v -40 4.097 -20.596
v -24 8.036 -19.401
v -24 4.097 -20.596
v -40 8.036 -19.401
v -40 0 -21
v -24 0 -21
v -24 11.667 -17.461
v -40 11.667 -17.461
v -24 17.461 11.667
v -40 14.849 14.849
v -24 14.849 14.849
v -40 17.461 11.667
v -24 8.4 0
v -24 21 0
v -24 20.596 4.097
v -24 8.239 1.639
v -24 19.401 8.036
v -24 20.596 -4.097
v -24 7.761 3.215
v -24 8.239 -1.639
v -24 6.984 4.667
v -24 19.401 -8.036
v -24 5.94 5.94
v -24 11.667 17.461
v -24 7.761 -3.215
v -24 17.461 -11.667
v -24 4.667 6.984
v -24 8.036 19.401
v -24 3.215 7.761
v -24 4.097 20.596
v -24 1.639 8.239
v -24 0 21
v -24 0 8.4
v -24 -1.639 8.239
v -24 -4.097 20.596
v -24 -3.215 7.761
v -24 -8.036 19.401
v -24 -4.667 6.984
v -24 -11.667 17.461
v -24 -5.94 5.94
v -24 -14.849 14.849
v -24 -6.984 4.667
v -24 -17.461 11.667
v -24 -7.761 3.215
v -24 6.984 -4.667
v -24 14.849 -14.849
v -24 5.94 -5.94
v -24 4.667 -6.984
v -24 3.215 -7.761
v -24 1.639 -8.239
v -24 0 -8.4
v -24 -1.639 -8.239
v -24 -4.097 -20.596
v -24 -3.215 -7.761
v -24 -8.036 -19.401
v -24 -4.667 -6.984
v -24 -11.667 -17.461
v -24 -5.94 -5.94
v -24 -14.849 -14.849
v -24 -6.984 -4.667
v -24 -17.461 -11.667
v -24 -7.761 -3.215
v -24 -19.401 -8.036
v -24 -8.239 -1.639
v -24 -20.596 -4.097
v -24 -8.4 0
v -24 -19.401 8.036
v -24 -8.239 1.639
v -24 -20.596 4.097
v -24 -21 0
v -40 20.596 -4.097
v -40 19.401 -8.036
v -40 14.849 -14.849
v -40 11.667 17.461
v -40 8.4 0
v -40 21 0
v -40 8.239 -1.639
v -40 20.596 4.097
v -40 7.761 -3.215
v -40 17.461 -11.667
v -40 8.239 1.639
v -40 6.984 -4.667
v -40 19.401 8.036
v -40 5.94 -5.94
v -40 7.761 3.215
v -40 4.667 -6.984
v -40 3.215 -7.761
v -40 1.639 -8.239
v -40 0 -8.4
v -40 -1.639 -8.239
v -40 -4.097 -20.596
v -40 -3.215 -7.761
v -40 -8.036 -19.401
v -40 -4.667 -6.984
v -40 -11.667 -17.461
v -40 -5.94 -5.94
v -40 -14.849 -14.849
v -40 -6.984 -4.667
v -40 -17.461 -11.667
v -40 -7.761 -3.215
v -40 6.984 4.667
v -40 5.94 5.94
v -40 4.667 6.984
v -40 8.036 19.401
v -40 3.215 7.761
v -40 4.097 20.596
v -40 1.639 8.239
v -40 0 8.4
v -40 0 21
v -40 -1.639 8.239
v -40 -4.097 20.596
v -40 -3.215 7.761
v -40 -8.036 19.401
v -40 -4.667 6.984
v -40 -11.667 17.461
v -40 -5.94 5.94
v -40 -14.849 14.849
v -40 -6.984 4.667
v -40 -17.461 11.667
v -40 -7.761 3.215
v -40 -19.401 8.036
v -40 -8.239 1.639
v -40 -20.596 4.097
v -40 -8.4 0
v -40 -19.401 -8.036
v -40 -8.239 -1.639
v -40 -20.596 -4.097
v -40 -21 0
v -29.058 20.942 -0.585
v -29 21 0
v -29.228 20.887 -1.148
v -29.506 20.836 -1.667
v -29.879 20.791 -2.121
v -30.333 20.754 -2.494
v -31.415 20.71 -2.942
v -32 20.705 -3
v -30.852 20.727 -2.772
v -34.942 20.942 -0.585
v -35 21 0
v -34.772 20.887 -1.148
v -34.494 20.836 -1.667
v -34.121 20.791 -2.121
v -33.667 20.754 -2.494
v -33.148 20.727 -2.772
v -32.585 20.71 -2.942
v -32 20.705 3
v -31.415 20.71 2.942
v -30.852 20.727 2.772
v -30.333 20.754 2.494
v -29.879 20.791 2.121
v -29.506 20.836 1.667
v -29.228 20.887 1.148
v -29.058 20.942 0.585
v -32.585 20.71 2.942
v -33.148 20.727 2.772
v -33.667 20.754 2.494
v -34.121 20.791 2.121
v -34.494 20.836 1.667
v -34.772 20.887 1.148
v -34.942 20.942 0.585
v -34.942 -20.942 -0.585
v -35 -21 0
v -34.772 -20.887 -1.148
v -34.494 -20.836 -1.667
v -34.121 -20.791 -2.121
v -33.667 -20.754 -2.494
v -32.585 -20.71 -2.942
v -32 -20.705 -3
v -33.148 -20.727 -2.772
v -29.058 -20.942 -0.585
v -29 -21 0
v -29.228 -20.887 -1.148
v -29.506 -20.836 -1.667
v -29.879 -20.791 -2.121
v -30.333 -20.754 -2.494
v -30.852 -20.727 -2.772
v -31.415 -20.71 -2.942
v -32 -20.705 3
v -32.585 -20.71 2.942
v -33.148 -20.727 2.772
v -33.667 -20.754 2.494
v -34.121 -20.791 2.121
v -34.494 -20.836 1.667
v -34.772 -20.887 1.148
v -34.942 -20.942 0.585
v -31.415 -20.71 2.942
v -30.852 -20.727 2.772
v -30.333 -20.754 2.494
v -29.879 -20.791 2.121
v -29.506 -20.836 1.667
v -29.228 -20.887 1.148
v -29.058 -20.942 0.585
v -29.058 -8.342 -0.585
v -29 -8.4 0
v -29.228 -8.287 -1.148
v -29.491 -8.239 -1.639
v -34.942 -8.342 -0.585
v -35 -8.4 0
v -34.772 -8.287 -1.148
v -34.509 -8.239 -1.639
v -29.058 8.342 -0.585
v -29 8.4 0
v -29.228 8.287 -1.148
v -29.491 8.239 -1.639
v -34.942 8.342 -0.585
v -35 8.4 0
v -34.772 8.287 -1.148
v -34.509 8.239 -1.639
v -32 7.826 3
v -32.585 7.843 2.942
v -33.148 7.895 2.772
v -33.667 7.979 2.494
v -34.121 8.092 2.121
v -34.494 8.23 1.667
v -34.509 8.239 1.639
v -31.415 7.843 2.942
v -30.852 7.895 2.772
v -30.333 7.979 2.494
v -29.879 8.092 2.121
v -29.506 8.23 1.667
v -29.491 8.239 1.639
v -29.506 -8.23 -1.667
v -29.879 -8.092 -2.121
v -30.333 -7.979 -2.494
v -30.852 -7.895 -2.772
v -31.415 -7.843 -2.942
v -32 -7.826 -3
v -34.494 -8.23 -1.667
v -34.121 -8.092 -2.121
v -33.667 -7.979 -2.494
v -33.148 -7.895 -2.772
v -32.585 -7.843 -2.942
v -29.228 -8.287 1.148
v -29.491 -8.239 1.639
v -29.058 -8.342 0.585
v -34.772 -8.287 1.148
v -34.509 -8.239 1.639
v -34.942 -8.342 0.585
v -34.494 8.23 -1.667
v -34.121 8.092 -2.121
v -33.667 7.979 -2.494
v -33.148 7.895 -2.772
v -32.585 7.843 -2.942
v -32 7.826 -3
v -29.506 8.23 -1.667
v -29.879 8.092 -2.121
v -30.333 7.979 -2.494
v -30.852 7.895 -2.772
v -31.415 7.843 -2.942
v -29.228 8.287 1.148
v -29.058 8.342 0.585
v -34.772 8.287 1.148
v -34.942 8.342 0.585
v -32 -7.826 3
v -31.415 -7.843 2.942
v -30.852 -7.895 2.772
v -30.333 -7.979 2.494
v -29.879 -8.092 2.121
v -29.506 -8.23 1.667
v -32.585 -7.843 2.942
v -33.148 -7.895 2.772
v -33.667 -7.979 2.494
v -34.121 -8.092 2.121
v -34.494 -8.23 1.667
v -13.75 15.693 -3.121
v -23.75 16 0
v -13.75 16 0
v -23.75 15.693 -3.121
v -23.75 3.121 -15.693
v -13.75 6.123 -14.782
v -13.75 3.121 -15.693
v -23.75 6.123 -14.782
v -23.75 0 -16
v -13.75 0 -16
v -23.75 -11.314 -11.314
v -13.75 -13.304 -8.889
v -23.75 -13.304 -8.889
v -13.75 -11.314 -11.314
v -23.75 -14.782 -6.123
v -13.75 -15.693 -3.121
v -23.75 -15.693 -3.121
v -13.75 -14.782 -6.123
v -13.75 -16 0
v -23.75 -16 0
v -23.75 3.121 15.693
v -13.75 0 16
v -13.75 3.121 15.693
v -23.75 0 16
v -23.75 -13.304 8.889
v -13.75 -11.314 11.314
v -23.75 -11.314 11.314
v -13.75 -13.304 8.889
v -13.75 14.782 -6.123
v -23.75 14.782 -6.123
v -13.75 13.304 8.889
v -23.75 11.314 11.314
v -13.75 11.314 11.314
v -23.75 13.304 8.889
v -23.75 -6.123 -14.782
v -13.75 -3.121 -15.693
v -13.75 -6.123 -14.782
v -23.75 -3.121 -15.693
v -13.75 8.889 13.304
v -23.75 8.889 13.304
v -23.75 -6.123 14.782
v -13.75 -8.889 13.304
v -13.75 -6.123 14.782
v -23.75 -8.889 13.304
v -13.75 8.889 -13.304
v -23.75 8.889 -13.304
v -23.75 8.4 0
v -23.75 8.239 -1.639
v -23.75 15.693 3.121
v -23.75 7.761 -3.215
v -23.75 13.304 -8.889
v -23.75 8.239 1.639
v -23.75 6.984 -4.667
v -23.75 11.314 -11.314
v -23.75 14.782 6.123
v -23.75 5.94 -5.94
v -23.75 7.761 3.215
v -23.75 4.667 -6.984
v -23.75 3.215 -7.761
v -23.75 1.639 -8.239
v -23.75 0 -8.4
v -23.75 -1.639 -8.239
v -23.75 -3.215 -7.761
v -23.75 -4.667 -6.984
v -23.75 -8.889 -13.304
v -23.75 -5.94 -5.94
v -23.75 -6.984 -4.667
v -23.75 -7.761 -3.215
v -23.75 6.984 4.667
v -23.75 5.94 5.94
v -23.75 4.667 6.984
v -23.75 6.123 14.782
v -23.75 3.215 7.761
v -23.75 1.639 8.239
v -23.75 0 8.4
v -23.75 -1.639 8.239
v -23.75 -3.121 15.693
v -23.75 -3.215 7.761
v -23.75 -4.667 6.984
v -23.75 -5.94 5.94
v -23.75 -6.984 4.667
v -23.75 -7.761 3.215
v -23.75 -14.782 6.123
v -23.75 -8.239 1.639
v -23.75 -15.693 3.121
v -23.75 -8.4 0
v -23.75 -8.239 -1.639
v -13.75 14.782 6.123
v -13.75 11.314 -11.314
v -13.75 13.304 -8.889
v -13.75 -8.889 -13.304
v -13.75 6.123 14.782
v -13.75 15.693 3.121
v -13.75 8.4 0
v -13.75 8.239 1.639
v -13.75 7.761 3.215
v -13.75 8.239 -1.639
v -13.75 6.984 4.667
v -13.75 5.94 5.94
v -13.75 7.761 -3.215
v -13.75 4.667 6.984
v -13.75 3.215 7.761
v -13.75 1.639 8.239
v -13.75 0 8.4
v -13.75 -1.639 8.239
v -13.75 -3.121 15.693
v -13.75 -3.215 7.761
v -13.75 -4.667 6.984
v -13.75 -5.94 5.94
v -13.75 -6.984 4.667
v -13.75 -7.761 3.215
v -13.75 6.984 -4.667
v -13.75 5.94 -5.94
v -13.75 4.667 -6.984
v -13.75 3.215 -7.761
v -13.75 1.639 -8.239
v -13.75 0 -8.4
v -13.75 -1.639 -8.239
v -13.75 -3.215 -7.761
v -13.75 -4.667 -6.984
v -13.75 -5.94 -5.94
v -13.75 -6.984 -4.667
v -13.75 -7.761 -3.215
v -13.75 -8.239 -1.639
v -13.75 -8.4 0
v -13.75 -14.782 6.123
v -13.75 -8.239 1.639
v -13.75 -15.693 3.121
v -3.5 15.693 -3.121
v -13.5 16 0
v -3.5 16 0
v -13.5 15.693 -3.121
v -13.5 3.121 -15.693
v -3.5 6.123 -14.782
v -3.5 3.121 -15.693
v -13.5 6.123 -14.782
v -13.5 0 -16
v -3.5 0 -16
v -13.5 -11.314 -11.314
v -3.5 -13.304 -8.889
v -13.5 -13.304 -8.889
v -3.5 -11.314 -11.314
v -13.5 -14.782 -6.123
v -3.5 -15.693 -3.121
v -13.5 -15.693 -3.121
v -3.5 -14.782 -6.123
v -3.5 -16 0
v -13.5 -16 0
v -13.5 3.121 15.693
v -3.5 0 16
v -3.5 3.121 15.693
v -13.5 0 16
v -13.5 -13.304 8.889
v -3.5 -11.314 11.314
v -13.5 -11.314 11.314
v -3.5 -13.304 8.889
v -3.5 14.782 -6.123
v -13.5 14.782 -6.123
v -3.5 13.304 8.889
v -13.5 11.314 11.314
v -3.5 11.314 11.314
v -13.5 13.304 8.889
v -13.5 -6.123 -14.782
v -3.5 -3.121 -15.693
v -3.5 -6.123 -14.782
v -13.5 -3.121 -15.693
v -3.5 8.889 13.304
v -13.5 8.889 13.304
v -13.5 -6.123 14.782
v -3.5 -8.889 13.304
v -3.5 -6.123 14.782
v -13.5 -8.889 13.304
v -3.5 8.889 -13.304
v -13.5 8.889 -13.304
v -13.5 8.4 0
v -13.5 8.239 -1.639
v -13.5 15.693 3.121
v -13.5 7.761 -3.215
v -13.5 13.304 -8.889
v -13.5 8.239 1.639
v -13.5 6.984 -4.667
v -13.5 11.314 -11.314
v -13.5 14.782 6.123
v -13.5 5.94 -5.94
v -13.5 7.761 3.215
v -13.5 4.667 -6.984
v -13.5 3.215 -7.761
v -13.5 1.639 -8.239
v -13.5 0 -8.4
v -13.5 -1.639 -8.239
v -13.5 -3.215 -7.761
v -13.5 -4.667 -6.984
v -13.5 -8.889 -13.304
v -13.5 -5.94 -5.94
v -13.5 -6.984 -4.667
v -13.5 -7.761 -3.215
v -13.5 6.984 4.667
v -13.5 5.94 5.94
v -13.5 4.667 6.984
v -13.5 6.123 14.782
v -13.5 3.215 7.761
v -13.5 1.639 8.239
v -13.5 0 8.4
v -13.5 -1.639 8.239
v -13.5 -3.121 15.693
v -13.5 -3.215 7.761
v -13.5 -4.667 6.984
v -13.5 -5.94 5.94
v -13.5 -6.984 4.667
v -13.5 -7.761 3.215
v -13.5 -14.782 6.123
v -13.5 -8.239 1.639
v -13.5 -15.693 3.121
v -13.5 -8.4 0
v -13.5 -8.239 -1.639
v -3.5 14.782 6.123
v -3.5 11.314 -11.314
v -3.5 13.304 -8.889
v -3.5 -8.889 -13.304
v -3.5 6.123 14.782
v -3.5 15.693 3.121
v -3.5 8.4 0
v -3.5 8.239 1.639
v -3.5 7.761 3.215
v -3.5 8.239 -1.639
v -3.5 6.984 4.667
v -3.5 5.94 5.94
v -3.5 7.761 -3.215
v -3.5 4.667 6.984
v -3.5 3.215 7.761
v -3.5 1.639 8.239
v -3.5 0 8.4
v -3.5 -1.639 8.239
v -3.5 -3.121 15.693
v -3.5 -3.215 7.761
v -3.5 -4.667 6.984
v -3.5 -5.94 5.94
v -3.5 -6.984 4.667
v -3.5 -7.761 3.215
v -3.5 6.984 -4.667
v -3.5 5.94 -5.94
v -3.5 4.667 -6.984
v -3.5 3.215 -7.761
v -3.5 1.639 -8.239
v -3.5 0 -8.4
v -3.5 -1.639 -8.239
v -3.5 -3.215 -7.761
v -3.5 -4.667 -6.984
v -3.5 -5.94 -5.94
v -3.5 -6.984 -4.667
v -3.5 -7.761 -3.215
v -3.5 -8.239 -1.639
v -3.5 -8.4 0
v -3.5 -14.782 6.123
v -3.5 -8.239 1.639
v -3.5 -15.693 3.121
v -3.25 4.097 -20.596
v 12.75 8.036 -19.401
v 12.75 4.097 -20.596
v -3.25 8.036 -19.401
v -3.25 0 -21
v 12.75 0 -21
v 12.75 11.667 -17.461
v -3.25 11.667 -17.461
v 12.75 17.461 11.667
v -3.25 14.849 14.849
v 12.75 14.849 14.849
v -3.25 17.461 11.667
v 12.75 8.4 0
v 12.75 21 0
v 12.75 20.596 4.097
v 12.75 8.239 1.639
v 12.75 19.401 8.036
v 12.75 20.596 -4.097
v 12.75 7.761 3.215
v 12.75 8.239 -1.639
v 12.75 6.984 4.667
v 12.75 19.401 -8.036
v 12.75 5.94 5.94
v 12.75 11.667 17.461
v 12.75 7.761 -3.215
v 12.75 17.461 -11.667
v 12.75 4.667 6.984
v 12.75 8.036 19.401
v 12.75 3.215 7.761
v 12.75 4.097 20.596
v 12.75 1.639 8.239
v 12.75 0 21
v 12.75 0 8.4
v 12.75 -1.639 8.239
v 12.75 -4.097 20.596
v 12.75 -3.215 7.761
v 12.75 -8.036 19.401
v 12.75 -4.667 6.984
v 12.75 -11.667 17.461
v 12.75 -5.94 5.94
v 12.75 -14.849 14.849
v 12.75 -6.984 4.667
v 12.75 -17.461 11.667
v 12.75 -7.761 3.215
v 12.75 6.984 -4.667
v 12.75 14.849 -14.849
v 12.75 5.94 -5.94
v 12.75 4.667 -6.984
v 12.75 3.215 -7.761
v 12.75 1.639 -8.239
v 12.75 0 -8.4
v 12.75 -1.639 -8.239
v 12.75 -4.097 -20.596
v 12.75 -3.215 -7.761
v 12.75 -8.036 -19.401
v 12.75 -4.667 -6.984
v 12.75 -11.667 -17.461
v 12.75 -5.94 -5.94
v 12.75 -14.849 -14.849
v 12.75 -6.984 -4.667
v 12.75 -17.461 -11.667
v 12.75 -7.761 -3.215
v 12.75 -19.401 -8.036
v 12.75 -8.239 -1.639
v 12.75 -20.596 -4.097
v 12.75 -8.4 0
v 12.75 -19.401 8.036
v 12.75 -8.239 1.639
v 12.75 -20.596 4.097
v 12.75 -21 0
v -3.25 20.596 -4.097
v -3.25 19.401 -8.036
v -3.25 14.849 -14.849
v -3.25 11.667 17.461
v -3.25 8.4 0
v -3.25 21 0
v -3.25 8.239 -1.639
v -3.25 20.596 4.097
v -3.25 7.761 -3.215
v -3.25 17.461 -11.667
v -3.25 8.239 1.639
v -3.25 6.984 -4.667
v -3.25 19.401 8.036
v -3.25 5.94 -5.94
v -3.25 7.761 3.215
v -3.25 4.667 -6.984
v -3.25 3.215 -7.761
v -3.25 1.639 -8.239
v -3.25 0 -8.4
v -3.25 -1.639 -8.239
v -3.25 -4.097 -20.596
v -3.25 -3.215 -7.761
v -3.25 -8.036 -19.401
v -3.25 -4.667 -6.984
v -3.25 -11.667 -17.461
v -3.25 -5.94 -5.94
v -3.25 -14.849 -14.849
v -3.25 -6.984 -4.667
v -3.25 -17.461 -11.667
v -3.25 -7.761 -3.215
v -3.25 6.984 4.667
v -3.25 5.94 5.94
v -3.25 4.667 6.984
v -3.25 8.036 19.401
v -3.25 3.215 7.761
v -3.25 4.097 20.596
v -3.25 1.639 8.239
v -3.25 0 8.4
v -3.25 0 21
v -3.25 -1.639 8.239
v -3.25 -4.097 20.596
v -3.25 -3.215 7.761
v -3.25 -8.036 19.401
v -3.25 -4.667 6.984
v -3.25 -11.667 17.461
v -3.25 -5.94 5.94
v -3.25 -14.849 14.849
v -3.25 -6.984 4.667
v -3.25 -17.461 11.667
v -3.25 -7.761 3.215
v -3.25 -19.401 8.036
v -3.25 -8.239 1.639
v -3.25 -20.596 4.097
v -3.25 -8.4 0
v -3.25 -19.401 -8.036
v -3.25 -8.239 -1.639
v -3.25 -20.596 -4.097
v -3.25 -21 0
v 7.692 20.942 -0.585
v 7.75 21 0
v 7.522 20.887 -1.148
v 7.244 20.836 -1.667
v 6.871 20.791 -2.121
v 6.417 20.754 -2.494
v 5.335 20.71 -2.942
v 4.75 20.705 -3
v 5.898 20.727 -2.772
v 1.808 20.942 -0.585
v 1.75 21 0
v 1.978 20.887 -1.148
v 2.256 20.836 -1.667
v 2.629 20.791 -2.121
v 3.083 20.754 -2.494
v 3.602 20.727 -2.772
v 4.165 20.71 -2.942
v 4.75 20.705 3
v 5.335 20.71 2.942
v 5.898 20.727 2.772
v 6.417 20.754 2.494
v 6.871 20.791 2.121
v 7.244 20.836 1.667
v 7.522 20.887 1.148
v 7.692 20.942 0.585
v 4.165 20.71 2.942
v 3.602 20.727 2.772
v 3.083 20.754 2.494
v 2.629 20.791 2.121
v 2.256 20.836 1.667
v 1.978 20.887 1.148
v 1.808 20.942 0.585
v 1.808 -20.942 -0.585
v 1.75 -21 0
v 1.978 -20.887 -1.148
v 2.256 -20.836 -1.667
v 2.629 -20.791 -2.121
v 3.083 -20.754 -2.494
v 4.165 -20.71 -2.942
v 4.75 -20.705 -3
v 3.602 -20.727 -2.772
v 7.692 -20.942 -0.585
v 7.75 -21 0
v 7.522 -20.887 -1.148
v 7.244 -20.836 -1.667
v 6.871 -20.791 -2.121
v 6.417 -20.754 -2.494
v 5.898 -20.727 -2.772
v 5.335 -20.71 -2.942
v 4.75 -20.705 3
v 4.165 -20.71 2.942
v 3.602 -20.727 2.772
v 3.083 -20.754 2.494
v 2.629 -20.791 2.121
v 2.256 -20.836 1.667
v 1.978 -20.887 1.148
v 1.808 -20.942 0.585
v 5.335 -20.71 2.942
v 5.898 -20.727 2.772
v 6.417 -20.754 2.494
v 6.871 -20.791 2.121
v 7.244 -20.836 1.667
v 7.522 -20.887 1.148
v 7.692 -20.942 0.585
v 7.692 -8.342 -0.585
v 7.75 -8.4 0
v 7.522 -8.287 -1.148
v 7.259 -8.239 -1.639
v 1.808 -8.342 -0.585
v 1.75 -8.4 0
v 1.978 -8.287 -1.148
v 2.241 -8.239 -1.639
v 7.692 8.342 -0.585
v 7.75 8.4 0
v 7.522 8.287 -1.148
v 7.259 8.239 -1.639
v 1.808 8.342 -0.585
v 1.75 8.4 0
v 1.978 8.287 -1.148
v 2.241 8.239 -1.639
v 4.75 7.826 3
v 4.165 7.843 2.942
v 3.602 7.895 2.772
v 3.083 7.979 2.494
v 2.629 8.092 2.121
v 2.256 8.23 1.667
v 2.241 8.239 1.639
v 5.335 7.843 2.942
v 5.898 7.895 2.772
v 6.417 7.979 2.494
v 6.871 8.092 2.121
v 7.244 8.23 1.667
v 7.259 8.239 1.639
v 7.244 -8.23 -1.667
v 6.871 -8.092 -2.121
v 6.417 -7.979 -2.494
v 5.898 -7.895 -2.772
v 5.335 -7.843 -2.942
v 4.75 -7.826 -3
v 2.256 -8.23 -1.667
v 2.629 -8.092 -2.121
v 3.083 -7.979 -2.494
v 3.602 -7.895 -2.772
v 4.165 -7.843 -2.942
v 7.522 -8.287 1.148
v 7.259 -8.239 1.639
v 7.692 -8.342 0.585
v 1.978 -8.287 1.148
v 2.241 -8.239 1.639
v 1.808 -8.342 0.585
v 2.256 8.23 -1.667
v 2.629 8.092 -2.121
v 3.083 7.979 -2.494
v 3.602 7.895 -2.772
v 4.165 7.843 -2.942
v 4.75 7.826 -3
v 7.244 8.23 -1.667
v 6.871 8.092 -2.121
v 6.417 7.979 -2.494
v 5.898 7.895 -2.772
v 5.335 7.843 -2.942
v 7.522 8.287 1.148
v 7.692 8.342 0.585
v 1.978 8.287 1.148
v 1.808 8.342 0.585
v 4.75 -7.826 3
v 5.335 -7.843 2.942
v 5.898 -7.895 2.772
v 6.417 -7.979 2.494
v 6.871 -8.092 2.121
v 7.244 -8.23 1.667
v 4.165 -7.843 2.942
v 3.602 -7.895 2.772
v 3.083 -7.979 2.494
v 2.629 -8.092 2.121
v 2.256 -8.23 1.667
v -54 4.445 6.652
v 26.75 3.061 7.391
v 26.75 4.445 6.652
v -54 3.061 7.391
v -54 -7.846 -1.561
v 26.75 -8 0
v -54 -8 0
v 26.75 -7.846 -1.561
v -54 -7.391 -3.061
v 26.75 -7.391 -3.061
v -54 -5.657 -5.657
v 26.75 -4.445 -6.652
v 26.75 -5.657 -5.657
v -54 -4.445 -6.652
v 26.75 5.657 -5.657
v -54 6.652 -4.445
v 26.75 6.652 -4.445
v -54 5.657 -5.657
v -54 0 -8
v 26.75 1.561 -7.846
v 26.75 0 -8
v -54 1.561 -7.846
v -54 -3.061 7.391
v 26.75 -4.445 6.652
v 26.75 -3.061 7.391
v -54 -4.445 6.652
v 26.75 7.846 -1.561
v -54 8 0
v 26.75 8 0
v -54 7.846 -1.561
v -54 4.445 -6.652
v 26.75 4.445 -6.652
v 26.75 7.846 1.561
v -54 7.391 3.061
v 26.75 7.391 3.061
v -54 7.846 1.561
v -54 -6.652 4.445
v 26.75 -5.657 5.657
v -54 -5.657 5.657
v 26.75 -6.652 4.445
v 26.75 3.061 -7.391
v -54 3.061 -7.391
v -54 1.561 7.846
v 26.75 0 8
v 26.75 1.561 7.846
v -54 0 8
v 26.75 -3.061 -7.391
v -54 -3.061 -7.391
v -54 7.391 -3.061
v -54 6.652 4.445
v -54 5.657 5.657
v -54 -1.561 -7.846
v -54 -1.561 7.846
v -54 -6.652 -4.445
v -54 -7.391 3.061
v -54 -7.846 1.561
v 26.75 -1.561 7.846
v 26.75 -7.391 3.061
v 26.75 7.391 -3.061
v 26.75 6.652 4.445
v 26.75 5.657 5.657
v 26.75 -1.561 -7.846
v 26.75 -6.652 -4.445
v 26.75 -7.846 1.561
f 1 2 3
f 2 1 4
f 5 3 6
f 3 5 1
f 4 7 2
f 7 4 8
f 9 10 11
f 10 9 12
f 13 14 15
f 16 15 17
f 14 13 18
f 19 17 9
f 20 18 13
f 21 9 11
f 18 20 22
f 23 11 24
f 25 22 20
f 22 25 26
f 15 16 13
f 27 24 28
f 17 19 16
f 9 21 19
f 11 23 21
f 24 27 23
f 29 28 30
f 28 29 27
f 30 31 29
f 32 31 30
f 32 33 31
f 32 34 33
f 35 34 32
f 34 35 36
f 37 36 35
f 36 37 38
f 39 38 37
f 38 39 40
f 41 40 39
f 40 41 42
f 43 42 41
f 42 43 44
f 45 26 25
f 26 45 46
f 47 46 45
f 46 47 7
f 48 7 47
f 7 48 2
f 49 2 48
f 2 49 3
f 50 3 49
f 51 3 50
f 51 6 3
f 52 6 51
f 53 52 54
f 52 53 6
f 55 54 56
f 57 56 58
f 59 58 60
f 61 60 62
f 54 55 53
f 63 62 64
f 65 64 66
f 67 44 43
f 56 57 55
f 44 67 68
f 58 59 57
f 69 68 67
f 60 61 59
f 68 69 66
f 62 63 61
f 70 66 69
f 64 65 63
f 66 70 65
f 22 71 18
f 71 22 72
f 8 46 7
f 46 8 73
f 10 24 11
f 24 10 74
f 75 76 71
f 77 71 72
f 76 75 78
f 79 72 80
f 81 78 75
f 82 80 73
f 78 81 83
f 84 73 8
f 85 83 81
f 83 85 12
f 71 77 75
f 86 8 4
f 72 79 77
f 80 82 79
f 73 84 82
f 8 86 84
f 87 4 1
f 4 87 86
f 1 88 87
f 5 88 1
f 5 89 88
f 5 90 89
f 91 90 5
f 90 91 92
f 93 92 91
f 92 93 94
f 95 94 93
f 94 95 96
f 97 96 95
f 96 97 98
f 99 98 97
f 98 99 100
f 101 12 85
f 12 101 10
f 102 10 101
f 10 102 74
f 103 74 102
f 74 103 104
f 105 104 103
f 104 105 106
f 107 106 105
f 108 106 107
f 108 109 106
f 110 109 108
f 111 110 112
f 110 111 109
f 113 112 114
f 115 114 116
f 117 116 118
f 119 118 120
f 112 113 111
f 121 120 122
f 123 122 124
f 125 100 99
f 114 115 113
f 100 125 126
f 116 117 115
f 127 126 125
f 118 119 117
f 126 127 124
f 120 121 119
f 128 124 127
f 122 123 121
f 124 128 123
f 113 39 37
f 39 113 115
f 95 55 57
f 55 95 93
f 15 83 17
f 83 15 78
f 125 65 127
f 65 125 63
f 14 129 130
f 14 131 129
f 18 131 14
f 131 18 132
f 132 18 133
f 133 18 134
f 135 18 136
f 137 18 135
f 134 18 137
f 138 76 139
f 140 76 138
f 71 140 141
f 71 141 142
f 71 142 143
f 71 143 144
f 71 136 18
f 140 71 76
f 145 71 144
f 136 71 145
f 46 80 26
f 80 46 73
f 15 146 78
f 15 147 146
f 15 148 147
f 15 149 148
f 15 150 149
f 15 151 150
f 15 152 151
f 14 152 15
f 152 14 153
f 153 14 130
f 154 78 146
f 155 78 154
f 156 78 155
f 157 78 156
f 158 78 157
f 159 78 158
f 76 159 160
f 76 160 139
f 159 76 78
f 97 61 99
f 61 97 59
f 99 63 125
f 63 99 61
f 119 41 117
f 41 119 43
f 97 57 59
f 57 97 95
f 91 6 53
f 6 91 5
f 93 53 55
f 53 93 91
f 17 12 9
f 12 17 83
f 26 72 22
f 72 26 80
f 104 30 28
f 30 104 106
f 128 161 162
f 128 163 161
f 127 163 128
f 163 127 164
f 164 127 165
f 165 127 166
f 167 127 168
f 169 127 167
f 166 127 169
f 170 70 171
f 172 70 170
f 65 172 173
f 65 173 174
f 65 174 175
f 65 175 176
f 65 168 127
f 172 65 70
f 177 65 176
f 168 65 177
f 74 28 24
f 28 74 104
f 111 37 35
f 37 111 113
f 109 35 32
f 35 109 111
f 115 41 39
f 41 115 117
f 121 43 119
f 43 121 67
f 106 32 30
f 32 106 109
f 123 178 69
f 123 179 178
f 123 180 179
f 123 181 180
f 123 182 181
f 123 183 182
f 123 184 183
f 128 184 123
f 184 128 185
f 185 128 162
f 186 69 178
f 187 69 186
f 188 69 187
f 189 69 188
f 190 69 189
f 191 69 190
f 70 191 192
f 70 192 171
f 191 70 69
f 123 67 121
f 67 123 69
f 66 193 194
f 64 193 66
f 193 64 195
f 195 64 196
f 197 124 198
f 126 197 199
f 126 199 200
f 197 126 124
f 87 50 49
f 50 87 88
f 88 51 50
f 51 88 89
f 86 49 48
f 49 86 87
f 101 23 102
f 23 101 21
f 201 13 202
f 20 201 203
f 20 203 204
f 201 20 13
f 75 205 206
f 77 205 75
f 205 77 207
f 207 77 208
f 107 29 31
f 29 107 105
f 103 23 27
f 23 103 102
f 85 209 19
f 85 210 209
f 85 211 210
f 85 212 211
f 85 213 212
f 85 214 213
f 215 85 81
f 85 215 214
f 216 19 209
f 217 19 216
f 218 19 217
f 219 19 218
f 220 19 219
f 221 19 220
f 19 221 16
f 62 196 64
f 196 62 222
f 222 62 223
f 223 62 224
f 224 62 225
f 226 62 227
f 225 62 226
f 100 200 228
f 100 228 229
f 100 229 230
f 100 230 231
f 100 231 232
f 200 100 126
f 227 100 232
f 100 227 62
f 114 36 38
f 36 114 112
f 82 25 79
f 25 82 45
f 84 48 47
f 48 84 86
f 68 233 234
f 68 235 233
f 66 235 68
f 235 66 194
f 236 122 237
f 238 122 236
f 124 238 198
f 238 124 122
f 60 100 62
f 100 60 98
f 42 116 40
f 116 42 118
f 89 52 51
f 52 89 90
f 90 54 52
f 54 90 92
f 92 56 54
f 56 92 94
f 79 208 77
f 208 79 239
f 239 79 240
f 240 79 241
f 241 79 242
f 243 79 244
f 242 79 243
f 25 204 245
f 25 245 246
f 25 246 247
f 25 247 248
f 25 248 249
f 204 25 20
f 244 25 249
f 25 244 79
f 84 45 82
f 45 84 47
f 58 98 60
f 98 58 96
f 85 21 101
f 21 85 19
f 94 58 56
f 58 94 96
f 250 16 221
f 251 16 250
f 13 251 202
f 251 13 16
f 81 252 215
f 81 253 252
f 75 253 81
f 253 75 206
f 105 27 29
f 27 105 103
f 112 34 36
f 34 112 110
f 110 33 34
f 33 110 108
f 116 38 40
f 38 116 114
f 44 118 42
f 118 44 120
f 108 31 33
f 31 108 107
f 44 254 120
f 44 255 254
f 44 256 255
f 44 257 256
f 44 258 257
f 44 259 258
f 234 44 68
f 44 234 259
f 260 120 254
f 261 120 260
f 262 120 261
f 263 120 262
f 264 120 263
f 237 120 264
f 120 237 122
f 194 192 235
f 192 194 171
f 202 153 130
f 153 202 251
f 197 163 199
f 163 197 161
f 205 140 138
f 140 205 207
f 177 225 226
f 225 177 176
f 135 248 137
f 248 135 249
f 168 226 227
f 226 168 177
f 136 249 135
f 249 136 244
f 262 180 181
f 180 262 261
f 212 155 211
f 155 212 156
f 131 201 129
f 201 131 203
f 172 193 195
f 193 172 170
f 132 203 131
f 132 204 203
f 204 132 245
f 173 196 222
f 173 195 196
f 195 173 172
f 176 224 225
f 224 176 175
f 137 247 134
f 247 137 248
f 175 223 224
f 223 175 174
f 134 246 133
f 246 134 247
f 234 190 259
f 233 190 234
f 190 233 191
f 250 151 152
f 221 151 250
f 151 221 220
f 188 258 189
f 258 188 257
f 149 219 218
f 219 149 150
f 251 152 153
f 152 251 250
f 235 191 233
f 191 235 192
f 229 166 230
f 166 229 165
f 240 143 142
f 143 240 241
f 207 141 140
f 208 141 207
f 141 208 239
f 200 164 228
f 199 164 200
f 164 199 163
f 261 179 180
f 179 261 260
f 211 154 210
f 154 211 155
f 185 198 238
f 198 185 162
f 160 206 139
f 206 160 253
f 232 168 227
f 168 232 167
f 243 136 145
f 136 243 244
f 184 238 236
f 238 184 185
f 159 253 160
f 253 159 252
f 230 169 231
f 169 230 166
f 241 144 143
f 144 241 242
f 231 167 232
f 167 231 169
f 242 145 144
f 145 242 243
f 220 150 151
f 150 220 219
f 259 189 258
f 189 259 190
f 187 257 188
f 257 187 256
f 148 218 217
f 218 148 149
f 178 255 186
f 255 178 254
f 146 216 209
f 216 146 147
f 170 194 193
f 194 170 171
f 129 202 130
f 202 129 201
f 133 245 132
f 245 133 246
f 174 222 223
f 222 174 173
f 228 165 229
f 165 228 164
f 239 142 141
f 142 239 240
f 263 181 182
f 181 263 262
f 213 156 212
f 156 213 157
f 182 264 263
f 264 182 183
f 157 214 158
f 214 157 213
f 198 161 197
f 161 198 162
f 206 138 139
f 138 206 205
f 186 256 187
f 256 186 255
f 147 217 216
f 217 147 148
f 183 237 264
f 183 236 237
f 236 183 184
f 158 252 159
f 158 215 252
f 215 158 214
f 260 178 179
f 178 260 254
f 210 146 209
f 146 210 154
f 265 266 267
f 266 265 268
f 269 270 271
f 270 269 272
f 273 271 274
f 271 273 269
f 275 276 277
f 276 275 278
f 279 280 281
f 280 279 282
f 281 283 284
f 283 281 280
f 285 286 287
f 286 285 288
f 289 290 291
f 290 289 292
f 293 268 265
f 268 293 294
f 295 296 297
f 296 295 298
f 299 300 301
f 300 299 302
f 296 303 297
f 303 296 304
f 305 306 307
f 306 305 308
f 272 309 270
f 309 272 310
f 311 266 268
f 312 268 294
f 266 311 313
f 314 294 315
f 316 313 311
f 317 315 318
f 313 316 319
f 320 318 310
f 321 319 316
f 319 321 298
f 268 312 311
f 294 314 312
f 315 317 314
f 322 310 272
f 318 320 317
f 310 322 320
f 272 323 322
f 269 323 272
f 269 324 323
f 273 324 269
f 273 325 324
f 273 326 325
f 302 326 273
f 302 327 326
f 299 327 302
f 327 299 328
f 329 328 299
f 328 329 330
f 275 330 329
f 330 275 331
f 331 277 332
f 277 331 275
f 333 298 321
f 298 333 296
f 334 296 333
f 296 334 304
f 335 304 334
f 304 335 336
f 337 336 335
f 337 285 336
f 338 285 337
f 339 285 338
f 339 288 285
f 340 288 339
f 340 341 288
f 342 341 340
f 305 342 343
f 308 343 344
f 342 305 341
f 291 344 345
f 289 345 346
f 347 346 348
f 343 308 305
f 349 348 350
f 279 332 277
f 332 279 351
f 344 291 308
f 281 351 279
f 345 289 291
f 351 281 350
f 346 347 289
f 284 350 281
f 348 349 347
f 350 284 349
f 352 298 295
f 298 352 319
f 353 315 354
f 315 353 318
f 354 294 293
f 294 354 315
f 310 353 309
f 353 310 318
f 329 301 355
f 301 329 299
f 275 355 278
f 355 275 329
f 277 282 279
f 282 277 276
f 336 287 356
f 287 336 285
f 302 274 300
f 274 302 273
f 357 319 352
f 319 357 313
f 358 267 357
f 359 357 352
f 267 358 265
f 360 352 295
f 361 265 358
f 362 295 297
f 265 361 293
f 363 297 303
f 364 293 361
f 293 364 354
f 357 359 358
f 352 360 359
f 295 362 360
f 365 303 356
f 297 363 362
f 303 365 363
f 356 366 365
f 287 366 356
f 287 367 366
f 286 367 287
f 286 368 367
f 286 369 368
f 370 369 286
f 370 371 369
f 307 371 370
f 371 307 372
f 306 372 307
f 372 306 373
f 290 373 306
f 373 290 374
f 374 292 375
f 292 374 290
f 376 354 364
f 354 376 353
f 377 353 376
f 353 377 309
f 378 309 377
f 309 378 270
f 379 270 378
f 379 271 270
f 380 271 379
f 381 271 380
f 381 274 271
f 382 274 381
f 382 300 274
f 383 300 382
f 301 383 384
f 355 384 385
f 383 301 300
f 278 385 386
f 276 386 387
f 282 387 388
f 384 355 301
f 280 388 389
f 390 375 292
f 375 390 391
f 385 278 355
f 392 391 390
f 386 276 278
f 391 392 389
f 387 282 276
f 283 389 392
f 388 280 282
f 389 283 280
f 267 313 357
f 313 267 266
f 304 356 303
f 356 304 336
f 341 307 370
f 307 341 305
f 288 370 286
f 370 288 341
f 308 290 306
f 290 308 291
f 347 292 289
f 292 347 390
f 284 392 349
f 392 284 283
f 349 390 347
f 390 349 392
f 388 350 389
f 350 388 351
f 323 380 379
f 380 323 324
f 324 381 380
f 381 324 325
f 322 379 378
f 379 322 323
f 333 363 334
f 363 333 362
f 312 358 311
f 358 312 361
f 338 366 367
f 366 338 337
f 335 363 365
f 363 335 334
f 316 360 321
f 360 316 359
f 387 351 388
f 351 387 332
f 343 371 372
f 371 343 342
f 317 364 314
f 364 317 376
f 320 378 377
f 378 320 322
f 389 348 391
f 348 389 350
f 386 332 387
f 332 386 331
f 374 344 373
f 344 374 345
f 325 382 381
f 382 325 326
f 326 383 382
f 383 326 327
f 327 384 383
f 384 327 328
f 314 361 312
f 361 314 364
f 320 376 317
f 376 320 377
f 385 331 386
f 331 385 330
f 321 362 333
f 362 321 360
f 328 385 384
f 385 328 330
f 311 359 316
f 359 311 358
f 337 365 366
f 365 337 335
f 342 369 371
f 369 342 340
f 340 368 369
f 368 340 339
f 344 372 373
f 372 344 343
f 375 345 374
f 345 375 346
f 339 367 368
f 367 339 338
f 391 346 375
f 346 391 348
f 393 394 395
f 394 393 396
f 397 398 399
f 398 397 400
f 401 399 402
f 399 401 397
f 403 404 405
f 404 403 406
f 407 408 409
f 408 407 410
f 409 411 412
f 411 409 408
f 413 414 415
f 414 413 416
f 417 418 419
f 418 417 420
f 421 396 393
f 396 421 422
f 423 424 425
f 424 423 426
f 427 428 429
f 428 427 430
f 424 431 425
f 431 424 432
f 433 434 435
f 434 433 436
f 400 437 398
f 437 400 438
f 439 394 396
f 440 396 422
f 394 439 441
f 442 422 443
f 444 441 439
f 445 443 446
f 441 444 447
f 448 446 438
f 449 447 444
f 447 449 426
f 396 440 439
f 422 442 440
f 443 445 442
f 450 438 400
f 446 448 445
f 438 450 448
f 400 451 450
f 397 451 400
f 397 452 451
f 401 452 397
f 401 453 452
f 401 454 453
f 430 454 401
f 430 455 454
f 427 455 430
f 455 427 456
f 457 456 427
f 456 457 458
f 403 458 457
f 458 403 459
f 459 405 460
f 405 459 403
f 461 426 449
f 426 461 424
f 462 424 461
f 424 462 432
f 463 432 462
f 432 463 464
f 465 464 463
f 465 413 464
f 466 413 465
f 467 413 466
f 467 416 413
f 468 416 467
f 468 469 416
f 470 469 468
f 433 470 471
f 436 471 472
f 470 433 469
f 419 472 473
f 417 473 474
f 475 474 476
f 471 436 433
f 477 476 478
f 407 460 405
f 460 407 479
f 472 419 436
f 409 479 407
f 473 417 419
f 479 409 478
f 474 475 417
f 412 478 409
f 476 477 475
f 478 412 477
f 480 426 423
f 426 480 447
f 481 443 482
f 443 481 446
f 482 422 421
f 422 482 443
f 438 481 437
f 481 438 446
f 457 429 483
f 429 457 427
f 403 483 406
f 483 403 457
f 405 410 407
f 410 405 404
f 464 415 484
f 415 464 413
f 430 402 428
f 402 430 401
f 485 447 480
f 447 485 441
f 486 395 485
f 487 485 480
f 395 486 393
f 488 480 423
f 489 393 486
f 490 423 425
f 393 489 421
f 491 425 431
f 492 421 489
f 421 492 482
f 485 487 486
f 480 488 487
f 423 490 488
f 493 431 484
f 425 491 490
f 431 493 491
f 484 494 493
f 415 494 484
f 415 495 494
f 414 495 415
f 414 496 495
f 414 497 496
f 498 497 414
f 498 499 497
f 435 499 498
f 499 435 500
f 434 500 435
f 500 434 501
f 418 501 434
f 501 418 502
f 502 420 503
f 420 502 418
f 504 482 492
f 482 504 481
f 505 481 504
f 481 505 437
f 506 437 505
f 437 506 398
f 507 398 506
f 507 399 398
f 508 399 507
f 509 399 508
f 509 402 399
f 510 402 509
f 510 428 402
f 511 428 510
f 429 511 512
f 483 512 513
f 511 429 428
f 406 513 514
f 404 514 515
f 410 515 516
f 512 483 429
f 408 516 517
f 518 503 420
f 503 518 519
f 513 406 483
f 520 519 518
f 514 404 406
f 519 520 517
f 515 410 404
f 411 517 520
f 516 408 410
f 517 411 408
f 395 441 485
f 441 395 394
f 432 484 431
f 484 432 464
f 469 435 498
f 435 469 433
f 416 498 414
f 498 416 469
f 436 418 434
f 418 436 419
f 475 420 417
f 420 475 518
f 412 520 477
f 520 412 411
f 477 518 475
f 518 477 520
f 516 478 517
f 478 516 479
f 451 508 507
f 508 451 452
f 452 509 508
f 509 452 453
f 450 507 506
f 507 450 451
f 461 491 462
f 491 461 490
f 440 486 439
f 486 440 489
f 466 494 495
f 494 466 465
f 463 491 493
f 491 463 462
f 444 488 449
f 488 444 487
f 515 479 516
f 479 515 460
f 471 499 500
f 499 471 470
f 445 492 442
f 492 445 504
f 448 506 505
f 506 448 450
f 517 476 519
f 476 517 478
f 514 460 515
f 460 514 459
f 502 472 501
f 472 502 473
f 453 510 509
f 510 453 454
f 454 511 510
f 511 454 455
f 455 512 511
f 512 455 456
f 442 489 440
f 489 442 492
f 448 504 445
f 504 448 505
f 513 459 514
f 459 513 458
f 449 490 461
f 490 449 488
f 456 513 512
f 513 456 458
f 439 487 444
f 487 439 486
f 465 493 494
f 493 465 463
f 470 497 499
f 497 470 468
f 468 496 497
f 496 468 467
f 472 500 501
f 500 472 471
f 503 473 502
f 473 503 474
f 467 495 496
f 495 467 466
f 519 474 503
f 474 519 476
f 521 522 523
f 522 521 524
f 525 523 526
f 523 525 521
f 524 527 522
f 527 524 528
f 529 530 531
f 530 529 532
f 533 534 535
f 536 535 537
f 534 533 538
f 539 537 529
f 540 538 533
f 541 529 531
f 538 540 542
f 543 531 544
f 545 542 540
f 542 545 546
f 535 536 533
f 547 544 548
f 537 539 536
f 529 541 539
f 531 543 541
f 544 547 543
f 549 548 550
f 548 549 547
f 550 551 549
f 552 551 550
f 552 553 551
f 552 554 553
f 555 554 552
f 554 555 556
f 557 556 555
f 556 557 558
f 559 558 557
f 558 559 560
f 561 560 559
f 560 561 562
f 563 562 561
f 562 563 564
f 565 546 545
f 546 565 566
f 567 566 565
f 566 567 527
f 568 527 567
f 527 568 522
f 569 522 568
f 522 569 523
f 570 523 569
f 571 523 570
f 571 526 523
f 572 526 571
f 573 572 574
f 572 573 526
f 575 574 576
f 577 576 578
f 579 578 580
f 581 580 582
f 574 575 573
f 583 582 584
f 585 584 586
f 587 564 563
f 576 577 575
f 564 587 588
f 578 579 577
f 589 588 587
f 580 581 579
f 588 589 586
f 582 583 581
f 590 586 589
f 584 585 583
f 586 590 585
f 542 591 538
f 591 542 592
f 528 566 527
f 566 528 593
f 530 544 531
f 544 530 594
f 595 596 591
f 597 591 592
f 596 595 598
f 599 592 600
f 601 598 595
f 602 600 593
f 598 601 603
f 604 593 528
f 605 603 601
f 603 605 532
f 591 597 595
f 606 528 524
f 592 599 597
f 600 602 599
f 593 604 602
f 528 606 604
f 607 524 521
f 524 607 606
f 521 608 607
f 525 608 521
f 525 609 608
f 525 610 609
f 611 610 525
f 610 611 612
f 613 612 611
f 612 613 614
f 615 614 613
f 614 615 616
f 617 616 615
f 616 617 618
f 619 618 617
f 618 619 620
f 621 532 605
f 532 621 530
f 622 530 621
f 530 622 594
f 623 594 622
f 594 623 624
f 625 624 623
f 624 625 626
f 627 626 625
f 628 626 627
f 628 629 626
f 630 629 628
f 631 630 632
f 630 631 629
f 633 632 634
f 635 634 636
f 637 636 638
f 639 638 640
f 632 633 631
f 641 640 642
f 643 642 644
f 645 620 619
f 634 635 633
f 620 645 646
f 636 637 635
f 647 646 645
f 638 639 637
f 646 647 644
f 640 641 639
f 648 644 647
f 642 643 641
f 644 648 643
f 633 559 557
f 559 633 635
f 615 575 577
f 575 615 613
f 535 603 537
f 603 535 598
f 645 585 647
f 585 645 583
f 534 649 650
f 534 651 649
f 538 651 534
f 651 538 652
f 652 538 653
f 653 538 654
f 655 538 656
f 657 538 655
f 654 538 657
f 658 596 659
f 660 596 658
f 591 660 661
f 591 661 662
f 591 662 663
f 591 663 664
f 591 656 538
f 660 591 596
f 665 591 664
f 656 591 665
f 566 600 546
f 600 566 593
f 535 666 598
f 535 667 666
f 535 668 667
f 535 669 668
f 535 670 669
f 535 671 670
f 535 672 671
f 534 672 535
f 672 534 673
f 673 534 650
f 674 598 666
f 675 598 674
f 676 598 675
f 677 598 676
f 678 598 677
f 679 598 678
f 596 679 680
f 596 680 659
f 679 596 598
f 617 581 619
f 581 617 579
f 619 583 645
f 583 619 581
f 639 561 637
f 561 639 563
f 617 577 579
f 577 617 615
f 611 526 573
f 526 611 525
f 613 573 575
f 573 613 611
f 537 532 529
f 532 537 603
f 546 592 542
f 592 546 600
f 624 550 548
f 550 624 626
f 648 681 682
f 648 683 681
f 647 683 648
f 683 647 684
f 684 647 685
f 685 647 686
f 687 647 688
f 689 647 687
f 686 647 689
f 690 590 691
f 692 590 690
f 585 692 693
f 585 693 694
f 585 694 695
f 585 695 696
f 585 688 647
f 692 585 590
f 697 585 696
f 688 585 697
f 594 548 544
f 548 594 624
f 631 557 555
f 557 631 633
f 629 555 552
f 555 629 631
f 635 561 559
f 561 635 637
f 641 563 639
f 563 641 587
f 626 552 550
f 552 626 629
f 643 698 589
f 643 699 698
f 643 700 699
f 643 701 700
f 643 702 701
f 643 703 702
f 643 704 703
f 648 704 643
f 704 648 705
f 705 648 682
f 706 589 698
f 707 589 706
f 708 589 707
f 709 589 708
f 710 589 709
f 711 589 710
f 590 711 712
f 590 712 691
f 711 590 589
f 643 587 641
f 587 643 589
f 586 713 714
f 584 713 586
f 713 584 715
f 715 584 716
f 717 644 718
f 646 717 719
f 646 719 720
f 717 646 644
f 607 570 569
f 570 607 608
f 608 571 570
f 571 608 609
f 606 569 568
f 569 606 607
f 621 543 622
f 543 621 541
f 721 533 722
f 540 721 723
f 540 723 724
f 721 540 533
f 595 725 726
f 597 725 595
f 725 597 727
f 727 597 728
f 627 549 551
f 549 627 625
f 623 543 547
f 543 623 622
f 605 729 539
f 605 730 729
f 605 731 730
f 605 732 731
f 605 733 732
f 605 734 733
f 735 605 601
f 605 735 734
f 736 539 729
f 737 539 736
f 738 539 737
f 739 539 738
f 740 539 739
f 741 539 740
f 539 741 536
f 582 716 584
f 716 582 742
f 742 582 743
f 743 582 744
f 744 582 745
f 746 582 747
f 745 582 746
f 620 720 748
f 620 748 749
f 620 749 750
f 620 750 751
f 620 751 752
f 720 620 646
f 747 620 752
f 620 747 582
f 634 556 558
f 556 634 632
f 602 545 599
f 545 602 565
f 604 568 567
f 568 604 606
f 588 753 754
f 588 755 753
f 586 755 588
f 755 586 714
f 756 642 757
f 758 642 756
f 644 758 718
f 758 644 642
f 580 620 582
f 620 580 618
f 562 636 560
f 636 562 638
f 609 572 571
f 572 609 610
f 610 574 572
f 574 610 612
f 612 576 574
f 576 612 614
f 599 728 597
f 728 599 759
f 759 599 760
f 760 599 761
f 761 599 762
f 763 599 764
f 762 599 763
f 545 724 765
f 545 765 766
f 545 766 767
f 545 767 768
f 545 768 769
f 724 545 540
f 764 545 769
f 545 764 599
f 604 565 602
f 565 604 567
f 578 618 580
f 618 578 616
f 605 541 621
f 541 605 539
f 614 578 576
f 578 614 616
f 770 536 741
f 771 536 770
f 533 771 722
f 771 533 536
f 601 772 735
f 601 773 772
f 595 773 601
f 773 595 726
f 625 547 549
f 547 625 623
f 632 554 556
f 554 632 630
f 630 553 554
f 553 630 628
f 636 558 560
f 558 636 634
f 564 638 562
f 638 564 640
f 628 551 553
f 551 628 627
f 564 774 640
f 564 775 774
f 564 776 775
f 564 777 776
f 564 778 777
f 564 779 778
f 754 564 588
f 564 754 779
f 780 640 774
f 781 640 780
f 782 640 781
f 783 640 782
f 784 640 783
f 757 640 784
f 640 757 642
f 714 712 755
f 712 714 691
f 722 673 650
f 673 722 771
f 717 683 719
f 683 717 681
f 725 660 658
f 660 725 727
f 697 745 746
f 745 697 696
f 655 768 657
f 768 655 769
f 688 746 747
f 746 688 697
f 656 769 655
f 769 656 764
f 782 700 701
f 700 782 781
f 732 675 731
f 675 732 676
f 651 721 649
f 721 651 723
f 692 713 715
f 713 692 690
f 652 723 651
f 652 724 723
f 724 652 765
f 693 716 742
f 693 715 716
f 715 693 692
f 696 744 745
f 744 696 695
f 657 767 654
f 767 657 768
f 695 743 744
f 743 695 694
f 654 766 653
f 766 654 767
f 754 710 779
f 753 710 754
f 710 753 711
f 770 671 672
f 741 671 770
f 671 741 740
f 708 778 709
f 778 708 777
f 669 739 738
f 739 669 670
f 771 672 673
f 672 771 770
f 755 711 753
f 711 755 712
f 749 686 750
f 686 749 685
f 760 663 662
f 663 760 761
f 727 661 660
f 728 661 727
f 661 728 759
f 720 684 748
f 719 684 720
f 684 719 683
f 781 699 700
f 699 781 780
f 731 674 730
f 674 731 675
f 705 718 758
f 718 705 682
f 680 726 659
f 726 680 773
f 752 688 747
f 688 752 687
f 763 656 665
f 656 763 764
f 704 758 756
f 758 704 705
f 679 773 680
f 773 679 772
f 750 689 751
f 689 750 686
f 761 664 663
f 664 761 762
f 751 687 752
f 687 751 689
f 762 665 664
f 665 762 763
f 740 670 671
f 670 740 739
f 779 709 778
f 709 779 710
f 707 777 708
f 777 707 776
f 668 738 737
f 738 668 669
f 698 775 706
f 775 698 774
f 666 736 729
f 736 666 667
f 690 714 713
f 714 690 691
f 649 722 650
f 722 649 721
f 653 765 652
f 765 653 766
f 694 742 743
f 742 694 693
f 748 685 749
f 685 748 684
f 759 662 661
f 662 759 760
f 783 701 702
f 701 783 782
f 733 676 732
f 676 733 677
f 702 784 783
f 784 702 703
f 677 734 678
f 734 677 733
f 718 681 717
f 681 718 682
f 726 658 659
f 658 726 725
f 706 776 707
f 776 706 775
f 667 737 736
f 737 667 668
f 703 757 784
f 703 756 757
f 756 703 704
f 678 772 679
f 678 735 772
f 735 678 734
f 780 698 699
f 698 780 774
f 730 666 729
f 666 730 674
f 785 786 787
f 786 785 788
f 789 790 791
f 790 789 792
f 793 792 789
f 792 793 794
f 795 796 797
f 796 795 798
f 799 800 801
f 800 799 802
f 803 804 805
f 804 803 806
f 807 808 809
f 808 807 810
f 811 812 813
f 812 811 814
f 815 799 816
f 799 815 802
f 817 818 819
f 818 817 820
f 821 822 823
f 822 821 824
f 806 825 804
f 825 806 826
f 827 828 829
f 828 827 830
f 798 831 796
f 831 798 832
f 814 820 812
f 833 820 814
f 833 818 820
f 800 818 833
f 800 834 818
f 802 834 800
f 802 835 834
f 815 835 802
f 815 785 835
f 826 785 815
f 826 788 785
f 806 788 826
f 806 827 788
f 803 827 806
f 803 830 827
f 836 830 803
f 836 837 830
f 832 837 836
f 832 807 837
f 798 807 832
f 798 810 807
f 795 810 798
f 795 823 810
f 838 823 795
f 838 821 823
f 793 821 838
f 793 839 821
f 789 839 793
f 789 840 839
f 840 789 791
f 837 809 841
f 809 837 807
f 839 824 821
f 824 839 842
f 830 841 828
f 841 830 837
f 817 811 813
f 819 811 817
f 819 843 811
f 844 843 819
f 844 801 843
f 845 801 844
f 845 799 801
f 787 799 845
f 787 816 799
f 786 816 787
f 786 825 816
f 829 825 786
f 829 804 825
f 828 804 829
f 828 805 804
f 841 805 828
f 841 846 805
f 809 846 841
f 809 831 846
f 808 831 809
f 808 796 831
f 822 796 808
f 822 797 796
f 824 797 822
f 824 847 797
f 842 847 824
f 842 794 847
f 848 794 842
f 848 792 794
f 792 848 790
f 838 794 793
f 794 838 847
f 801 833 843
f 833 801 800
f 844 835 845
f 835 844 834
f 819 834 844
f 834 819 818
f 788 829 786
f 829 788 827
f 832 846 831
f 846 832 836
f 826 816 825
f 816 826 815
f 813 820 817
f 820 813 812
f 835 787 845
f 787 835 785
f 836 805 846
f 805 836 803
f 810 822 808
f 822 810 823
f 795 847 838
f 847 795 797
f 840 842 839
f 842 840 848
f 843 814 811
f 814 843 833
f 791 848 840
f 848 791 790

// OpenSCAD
$fn = 32;

// ------------------------------------------------------------------------
// Shaft with rings and collars: d16 shaft, 4 rings
// Every part is its own module, assembly() places them once.
// ------------------------------------------------------------------------

// --- part 1 ---
module shaft() {
  translate([0, 0, -40.375]) cylinder(h = 80.75, d = 16);
}

// --- part 2 ---
module collar_a() {
  difference() {
    cylinder(h = 16, d = 42);
    translate([0, 0, -1]) cylinder(h = 18, d = 16.8);
    translate([0, 0, 8]) rotate([90, 0, 0]) cylinder(h = 44, d = 6, center = true);
  }
}

// --- part 3 ---
module spacer_a() {
  difference() {
      translate([0, 0, 0]) cylinder(h = 10, d = 32);
      translate([0, 0, -1]) cylinder(h = 12, d = 16.8);
    }
}

// --- part 4 ---
module spacer_b() {
  difference() {
      translate([0, 0, 0]) cylinder(h = 10, d = 32);
      translate([0, 0, -1]) cylinder(h = 12, d = 16.8);
    }
}

// --- part 5 ---
module collar_b() {
  difference() {
    cylinder(h = 16, d = 42);
    translate([0, 0, -1]) cylinder(h = 18, d = 16.8);
    translate([0, 0, 8]) rotate([90, 0, 0]) cylinder(h = 44, d = 6, center = true);
  }
}

// --- assembly ---
module assembly() {
  translate([-13.625, 0, 0]) rotate([0, 90, 0]) shaft();
  translate([-40, 0, 0]) rotate([0, 90, 0]) collar_a();
  translate([-23.75, 0, 0]) rotate([0, 90, 0]) spacer_a();
  translate([-13.5, 0, 0]) rotate([0, 90, 0]) spacer_b();
  translate([-3.25, 0, 0]) rotate([0, 90, 0]) collar_b();
}

assembly();
